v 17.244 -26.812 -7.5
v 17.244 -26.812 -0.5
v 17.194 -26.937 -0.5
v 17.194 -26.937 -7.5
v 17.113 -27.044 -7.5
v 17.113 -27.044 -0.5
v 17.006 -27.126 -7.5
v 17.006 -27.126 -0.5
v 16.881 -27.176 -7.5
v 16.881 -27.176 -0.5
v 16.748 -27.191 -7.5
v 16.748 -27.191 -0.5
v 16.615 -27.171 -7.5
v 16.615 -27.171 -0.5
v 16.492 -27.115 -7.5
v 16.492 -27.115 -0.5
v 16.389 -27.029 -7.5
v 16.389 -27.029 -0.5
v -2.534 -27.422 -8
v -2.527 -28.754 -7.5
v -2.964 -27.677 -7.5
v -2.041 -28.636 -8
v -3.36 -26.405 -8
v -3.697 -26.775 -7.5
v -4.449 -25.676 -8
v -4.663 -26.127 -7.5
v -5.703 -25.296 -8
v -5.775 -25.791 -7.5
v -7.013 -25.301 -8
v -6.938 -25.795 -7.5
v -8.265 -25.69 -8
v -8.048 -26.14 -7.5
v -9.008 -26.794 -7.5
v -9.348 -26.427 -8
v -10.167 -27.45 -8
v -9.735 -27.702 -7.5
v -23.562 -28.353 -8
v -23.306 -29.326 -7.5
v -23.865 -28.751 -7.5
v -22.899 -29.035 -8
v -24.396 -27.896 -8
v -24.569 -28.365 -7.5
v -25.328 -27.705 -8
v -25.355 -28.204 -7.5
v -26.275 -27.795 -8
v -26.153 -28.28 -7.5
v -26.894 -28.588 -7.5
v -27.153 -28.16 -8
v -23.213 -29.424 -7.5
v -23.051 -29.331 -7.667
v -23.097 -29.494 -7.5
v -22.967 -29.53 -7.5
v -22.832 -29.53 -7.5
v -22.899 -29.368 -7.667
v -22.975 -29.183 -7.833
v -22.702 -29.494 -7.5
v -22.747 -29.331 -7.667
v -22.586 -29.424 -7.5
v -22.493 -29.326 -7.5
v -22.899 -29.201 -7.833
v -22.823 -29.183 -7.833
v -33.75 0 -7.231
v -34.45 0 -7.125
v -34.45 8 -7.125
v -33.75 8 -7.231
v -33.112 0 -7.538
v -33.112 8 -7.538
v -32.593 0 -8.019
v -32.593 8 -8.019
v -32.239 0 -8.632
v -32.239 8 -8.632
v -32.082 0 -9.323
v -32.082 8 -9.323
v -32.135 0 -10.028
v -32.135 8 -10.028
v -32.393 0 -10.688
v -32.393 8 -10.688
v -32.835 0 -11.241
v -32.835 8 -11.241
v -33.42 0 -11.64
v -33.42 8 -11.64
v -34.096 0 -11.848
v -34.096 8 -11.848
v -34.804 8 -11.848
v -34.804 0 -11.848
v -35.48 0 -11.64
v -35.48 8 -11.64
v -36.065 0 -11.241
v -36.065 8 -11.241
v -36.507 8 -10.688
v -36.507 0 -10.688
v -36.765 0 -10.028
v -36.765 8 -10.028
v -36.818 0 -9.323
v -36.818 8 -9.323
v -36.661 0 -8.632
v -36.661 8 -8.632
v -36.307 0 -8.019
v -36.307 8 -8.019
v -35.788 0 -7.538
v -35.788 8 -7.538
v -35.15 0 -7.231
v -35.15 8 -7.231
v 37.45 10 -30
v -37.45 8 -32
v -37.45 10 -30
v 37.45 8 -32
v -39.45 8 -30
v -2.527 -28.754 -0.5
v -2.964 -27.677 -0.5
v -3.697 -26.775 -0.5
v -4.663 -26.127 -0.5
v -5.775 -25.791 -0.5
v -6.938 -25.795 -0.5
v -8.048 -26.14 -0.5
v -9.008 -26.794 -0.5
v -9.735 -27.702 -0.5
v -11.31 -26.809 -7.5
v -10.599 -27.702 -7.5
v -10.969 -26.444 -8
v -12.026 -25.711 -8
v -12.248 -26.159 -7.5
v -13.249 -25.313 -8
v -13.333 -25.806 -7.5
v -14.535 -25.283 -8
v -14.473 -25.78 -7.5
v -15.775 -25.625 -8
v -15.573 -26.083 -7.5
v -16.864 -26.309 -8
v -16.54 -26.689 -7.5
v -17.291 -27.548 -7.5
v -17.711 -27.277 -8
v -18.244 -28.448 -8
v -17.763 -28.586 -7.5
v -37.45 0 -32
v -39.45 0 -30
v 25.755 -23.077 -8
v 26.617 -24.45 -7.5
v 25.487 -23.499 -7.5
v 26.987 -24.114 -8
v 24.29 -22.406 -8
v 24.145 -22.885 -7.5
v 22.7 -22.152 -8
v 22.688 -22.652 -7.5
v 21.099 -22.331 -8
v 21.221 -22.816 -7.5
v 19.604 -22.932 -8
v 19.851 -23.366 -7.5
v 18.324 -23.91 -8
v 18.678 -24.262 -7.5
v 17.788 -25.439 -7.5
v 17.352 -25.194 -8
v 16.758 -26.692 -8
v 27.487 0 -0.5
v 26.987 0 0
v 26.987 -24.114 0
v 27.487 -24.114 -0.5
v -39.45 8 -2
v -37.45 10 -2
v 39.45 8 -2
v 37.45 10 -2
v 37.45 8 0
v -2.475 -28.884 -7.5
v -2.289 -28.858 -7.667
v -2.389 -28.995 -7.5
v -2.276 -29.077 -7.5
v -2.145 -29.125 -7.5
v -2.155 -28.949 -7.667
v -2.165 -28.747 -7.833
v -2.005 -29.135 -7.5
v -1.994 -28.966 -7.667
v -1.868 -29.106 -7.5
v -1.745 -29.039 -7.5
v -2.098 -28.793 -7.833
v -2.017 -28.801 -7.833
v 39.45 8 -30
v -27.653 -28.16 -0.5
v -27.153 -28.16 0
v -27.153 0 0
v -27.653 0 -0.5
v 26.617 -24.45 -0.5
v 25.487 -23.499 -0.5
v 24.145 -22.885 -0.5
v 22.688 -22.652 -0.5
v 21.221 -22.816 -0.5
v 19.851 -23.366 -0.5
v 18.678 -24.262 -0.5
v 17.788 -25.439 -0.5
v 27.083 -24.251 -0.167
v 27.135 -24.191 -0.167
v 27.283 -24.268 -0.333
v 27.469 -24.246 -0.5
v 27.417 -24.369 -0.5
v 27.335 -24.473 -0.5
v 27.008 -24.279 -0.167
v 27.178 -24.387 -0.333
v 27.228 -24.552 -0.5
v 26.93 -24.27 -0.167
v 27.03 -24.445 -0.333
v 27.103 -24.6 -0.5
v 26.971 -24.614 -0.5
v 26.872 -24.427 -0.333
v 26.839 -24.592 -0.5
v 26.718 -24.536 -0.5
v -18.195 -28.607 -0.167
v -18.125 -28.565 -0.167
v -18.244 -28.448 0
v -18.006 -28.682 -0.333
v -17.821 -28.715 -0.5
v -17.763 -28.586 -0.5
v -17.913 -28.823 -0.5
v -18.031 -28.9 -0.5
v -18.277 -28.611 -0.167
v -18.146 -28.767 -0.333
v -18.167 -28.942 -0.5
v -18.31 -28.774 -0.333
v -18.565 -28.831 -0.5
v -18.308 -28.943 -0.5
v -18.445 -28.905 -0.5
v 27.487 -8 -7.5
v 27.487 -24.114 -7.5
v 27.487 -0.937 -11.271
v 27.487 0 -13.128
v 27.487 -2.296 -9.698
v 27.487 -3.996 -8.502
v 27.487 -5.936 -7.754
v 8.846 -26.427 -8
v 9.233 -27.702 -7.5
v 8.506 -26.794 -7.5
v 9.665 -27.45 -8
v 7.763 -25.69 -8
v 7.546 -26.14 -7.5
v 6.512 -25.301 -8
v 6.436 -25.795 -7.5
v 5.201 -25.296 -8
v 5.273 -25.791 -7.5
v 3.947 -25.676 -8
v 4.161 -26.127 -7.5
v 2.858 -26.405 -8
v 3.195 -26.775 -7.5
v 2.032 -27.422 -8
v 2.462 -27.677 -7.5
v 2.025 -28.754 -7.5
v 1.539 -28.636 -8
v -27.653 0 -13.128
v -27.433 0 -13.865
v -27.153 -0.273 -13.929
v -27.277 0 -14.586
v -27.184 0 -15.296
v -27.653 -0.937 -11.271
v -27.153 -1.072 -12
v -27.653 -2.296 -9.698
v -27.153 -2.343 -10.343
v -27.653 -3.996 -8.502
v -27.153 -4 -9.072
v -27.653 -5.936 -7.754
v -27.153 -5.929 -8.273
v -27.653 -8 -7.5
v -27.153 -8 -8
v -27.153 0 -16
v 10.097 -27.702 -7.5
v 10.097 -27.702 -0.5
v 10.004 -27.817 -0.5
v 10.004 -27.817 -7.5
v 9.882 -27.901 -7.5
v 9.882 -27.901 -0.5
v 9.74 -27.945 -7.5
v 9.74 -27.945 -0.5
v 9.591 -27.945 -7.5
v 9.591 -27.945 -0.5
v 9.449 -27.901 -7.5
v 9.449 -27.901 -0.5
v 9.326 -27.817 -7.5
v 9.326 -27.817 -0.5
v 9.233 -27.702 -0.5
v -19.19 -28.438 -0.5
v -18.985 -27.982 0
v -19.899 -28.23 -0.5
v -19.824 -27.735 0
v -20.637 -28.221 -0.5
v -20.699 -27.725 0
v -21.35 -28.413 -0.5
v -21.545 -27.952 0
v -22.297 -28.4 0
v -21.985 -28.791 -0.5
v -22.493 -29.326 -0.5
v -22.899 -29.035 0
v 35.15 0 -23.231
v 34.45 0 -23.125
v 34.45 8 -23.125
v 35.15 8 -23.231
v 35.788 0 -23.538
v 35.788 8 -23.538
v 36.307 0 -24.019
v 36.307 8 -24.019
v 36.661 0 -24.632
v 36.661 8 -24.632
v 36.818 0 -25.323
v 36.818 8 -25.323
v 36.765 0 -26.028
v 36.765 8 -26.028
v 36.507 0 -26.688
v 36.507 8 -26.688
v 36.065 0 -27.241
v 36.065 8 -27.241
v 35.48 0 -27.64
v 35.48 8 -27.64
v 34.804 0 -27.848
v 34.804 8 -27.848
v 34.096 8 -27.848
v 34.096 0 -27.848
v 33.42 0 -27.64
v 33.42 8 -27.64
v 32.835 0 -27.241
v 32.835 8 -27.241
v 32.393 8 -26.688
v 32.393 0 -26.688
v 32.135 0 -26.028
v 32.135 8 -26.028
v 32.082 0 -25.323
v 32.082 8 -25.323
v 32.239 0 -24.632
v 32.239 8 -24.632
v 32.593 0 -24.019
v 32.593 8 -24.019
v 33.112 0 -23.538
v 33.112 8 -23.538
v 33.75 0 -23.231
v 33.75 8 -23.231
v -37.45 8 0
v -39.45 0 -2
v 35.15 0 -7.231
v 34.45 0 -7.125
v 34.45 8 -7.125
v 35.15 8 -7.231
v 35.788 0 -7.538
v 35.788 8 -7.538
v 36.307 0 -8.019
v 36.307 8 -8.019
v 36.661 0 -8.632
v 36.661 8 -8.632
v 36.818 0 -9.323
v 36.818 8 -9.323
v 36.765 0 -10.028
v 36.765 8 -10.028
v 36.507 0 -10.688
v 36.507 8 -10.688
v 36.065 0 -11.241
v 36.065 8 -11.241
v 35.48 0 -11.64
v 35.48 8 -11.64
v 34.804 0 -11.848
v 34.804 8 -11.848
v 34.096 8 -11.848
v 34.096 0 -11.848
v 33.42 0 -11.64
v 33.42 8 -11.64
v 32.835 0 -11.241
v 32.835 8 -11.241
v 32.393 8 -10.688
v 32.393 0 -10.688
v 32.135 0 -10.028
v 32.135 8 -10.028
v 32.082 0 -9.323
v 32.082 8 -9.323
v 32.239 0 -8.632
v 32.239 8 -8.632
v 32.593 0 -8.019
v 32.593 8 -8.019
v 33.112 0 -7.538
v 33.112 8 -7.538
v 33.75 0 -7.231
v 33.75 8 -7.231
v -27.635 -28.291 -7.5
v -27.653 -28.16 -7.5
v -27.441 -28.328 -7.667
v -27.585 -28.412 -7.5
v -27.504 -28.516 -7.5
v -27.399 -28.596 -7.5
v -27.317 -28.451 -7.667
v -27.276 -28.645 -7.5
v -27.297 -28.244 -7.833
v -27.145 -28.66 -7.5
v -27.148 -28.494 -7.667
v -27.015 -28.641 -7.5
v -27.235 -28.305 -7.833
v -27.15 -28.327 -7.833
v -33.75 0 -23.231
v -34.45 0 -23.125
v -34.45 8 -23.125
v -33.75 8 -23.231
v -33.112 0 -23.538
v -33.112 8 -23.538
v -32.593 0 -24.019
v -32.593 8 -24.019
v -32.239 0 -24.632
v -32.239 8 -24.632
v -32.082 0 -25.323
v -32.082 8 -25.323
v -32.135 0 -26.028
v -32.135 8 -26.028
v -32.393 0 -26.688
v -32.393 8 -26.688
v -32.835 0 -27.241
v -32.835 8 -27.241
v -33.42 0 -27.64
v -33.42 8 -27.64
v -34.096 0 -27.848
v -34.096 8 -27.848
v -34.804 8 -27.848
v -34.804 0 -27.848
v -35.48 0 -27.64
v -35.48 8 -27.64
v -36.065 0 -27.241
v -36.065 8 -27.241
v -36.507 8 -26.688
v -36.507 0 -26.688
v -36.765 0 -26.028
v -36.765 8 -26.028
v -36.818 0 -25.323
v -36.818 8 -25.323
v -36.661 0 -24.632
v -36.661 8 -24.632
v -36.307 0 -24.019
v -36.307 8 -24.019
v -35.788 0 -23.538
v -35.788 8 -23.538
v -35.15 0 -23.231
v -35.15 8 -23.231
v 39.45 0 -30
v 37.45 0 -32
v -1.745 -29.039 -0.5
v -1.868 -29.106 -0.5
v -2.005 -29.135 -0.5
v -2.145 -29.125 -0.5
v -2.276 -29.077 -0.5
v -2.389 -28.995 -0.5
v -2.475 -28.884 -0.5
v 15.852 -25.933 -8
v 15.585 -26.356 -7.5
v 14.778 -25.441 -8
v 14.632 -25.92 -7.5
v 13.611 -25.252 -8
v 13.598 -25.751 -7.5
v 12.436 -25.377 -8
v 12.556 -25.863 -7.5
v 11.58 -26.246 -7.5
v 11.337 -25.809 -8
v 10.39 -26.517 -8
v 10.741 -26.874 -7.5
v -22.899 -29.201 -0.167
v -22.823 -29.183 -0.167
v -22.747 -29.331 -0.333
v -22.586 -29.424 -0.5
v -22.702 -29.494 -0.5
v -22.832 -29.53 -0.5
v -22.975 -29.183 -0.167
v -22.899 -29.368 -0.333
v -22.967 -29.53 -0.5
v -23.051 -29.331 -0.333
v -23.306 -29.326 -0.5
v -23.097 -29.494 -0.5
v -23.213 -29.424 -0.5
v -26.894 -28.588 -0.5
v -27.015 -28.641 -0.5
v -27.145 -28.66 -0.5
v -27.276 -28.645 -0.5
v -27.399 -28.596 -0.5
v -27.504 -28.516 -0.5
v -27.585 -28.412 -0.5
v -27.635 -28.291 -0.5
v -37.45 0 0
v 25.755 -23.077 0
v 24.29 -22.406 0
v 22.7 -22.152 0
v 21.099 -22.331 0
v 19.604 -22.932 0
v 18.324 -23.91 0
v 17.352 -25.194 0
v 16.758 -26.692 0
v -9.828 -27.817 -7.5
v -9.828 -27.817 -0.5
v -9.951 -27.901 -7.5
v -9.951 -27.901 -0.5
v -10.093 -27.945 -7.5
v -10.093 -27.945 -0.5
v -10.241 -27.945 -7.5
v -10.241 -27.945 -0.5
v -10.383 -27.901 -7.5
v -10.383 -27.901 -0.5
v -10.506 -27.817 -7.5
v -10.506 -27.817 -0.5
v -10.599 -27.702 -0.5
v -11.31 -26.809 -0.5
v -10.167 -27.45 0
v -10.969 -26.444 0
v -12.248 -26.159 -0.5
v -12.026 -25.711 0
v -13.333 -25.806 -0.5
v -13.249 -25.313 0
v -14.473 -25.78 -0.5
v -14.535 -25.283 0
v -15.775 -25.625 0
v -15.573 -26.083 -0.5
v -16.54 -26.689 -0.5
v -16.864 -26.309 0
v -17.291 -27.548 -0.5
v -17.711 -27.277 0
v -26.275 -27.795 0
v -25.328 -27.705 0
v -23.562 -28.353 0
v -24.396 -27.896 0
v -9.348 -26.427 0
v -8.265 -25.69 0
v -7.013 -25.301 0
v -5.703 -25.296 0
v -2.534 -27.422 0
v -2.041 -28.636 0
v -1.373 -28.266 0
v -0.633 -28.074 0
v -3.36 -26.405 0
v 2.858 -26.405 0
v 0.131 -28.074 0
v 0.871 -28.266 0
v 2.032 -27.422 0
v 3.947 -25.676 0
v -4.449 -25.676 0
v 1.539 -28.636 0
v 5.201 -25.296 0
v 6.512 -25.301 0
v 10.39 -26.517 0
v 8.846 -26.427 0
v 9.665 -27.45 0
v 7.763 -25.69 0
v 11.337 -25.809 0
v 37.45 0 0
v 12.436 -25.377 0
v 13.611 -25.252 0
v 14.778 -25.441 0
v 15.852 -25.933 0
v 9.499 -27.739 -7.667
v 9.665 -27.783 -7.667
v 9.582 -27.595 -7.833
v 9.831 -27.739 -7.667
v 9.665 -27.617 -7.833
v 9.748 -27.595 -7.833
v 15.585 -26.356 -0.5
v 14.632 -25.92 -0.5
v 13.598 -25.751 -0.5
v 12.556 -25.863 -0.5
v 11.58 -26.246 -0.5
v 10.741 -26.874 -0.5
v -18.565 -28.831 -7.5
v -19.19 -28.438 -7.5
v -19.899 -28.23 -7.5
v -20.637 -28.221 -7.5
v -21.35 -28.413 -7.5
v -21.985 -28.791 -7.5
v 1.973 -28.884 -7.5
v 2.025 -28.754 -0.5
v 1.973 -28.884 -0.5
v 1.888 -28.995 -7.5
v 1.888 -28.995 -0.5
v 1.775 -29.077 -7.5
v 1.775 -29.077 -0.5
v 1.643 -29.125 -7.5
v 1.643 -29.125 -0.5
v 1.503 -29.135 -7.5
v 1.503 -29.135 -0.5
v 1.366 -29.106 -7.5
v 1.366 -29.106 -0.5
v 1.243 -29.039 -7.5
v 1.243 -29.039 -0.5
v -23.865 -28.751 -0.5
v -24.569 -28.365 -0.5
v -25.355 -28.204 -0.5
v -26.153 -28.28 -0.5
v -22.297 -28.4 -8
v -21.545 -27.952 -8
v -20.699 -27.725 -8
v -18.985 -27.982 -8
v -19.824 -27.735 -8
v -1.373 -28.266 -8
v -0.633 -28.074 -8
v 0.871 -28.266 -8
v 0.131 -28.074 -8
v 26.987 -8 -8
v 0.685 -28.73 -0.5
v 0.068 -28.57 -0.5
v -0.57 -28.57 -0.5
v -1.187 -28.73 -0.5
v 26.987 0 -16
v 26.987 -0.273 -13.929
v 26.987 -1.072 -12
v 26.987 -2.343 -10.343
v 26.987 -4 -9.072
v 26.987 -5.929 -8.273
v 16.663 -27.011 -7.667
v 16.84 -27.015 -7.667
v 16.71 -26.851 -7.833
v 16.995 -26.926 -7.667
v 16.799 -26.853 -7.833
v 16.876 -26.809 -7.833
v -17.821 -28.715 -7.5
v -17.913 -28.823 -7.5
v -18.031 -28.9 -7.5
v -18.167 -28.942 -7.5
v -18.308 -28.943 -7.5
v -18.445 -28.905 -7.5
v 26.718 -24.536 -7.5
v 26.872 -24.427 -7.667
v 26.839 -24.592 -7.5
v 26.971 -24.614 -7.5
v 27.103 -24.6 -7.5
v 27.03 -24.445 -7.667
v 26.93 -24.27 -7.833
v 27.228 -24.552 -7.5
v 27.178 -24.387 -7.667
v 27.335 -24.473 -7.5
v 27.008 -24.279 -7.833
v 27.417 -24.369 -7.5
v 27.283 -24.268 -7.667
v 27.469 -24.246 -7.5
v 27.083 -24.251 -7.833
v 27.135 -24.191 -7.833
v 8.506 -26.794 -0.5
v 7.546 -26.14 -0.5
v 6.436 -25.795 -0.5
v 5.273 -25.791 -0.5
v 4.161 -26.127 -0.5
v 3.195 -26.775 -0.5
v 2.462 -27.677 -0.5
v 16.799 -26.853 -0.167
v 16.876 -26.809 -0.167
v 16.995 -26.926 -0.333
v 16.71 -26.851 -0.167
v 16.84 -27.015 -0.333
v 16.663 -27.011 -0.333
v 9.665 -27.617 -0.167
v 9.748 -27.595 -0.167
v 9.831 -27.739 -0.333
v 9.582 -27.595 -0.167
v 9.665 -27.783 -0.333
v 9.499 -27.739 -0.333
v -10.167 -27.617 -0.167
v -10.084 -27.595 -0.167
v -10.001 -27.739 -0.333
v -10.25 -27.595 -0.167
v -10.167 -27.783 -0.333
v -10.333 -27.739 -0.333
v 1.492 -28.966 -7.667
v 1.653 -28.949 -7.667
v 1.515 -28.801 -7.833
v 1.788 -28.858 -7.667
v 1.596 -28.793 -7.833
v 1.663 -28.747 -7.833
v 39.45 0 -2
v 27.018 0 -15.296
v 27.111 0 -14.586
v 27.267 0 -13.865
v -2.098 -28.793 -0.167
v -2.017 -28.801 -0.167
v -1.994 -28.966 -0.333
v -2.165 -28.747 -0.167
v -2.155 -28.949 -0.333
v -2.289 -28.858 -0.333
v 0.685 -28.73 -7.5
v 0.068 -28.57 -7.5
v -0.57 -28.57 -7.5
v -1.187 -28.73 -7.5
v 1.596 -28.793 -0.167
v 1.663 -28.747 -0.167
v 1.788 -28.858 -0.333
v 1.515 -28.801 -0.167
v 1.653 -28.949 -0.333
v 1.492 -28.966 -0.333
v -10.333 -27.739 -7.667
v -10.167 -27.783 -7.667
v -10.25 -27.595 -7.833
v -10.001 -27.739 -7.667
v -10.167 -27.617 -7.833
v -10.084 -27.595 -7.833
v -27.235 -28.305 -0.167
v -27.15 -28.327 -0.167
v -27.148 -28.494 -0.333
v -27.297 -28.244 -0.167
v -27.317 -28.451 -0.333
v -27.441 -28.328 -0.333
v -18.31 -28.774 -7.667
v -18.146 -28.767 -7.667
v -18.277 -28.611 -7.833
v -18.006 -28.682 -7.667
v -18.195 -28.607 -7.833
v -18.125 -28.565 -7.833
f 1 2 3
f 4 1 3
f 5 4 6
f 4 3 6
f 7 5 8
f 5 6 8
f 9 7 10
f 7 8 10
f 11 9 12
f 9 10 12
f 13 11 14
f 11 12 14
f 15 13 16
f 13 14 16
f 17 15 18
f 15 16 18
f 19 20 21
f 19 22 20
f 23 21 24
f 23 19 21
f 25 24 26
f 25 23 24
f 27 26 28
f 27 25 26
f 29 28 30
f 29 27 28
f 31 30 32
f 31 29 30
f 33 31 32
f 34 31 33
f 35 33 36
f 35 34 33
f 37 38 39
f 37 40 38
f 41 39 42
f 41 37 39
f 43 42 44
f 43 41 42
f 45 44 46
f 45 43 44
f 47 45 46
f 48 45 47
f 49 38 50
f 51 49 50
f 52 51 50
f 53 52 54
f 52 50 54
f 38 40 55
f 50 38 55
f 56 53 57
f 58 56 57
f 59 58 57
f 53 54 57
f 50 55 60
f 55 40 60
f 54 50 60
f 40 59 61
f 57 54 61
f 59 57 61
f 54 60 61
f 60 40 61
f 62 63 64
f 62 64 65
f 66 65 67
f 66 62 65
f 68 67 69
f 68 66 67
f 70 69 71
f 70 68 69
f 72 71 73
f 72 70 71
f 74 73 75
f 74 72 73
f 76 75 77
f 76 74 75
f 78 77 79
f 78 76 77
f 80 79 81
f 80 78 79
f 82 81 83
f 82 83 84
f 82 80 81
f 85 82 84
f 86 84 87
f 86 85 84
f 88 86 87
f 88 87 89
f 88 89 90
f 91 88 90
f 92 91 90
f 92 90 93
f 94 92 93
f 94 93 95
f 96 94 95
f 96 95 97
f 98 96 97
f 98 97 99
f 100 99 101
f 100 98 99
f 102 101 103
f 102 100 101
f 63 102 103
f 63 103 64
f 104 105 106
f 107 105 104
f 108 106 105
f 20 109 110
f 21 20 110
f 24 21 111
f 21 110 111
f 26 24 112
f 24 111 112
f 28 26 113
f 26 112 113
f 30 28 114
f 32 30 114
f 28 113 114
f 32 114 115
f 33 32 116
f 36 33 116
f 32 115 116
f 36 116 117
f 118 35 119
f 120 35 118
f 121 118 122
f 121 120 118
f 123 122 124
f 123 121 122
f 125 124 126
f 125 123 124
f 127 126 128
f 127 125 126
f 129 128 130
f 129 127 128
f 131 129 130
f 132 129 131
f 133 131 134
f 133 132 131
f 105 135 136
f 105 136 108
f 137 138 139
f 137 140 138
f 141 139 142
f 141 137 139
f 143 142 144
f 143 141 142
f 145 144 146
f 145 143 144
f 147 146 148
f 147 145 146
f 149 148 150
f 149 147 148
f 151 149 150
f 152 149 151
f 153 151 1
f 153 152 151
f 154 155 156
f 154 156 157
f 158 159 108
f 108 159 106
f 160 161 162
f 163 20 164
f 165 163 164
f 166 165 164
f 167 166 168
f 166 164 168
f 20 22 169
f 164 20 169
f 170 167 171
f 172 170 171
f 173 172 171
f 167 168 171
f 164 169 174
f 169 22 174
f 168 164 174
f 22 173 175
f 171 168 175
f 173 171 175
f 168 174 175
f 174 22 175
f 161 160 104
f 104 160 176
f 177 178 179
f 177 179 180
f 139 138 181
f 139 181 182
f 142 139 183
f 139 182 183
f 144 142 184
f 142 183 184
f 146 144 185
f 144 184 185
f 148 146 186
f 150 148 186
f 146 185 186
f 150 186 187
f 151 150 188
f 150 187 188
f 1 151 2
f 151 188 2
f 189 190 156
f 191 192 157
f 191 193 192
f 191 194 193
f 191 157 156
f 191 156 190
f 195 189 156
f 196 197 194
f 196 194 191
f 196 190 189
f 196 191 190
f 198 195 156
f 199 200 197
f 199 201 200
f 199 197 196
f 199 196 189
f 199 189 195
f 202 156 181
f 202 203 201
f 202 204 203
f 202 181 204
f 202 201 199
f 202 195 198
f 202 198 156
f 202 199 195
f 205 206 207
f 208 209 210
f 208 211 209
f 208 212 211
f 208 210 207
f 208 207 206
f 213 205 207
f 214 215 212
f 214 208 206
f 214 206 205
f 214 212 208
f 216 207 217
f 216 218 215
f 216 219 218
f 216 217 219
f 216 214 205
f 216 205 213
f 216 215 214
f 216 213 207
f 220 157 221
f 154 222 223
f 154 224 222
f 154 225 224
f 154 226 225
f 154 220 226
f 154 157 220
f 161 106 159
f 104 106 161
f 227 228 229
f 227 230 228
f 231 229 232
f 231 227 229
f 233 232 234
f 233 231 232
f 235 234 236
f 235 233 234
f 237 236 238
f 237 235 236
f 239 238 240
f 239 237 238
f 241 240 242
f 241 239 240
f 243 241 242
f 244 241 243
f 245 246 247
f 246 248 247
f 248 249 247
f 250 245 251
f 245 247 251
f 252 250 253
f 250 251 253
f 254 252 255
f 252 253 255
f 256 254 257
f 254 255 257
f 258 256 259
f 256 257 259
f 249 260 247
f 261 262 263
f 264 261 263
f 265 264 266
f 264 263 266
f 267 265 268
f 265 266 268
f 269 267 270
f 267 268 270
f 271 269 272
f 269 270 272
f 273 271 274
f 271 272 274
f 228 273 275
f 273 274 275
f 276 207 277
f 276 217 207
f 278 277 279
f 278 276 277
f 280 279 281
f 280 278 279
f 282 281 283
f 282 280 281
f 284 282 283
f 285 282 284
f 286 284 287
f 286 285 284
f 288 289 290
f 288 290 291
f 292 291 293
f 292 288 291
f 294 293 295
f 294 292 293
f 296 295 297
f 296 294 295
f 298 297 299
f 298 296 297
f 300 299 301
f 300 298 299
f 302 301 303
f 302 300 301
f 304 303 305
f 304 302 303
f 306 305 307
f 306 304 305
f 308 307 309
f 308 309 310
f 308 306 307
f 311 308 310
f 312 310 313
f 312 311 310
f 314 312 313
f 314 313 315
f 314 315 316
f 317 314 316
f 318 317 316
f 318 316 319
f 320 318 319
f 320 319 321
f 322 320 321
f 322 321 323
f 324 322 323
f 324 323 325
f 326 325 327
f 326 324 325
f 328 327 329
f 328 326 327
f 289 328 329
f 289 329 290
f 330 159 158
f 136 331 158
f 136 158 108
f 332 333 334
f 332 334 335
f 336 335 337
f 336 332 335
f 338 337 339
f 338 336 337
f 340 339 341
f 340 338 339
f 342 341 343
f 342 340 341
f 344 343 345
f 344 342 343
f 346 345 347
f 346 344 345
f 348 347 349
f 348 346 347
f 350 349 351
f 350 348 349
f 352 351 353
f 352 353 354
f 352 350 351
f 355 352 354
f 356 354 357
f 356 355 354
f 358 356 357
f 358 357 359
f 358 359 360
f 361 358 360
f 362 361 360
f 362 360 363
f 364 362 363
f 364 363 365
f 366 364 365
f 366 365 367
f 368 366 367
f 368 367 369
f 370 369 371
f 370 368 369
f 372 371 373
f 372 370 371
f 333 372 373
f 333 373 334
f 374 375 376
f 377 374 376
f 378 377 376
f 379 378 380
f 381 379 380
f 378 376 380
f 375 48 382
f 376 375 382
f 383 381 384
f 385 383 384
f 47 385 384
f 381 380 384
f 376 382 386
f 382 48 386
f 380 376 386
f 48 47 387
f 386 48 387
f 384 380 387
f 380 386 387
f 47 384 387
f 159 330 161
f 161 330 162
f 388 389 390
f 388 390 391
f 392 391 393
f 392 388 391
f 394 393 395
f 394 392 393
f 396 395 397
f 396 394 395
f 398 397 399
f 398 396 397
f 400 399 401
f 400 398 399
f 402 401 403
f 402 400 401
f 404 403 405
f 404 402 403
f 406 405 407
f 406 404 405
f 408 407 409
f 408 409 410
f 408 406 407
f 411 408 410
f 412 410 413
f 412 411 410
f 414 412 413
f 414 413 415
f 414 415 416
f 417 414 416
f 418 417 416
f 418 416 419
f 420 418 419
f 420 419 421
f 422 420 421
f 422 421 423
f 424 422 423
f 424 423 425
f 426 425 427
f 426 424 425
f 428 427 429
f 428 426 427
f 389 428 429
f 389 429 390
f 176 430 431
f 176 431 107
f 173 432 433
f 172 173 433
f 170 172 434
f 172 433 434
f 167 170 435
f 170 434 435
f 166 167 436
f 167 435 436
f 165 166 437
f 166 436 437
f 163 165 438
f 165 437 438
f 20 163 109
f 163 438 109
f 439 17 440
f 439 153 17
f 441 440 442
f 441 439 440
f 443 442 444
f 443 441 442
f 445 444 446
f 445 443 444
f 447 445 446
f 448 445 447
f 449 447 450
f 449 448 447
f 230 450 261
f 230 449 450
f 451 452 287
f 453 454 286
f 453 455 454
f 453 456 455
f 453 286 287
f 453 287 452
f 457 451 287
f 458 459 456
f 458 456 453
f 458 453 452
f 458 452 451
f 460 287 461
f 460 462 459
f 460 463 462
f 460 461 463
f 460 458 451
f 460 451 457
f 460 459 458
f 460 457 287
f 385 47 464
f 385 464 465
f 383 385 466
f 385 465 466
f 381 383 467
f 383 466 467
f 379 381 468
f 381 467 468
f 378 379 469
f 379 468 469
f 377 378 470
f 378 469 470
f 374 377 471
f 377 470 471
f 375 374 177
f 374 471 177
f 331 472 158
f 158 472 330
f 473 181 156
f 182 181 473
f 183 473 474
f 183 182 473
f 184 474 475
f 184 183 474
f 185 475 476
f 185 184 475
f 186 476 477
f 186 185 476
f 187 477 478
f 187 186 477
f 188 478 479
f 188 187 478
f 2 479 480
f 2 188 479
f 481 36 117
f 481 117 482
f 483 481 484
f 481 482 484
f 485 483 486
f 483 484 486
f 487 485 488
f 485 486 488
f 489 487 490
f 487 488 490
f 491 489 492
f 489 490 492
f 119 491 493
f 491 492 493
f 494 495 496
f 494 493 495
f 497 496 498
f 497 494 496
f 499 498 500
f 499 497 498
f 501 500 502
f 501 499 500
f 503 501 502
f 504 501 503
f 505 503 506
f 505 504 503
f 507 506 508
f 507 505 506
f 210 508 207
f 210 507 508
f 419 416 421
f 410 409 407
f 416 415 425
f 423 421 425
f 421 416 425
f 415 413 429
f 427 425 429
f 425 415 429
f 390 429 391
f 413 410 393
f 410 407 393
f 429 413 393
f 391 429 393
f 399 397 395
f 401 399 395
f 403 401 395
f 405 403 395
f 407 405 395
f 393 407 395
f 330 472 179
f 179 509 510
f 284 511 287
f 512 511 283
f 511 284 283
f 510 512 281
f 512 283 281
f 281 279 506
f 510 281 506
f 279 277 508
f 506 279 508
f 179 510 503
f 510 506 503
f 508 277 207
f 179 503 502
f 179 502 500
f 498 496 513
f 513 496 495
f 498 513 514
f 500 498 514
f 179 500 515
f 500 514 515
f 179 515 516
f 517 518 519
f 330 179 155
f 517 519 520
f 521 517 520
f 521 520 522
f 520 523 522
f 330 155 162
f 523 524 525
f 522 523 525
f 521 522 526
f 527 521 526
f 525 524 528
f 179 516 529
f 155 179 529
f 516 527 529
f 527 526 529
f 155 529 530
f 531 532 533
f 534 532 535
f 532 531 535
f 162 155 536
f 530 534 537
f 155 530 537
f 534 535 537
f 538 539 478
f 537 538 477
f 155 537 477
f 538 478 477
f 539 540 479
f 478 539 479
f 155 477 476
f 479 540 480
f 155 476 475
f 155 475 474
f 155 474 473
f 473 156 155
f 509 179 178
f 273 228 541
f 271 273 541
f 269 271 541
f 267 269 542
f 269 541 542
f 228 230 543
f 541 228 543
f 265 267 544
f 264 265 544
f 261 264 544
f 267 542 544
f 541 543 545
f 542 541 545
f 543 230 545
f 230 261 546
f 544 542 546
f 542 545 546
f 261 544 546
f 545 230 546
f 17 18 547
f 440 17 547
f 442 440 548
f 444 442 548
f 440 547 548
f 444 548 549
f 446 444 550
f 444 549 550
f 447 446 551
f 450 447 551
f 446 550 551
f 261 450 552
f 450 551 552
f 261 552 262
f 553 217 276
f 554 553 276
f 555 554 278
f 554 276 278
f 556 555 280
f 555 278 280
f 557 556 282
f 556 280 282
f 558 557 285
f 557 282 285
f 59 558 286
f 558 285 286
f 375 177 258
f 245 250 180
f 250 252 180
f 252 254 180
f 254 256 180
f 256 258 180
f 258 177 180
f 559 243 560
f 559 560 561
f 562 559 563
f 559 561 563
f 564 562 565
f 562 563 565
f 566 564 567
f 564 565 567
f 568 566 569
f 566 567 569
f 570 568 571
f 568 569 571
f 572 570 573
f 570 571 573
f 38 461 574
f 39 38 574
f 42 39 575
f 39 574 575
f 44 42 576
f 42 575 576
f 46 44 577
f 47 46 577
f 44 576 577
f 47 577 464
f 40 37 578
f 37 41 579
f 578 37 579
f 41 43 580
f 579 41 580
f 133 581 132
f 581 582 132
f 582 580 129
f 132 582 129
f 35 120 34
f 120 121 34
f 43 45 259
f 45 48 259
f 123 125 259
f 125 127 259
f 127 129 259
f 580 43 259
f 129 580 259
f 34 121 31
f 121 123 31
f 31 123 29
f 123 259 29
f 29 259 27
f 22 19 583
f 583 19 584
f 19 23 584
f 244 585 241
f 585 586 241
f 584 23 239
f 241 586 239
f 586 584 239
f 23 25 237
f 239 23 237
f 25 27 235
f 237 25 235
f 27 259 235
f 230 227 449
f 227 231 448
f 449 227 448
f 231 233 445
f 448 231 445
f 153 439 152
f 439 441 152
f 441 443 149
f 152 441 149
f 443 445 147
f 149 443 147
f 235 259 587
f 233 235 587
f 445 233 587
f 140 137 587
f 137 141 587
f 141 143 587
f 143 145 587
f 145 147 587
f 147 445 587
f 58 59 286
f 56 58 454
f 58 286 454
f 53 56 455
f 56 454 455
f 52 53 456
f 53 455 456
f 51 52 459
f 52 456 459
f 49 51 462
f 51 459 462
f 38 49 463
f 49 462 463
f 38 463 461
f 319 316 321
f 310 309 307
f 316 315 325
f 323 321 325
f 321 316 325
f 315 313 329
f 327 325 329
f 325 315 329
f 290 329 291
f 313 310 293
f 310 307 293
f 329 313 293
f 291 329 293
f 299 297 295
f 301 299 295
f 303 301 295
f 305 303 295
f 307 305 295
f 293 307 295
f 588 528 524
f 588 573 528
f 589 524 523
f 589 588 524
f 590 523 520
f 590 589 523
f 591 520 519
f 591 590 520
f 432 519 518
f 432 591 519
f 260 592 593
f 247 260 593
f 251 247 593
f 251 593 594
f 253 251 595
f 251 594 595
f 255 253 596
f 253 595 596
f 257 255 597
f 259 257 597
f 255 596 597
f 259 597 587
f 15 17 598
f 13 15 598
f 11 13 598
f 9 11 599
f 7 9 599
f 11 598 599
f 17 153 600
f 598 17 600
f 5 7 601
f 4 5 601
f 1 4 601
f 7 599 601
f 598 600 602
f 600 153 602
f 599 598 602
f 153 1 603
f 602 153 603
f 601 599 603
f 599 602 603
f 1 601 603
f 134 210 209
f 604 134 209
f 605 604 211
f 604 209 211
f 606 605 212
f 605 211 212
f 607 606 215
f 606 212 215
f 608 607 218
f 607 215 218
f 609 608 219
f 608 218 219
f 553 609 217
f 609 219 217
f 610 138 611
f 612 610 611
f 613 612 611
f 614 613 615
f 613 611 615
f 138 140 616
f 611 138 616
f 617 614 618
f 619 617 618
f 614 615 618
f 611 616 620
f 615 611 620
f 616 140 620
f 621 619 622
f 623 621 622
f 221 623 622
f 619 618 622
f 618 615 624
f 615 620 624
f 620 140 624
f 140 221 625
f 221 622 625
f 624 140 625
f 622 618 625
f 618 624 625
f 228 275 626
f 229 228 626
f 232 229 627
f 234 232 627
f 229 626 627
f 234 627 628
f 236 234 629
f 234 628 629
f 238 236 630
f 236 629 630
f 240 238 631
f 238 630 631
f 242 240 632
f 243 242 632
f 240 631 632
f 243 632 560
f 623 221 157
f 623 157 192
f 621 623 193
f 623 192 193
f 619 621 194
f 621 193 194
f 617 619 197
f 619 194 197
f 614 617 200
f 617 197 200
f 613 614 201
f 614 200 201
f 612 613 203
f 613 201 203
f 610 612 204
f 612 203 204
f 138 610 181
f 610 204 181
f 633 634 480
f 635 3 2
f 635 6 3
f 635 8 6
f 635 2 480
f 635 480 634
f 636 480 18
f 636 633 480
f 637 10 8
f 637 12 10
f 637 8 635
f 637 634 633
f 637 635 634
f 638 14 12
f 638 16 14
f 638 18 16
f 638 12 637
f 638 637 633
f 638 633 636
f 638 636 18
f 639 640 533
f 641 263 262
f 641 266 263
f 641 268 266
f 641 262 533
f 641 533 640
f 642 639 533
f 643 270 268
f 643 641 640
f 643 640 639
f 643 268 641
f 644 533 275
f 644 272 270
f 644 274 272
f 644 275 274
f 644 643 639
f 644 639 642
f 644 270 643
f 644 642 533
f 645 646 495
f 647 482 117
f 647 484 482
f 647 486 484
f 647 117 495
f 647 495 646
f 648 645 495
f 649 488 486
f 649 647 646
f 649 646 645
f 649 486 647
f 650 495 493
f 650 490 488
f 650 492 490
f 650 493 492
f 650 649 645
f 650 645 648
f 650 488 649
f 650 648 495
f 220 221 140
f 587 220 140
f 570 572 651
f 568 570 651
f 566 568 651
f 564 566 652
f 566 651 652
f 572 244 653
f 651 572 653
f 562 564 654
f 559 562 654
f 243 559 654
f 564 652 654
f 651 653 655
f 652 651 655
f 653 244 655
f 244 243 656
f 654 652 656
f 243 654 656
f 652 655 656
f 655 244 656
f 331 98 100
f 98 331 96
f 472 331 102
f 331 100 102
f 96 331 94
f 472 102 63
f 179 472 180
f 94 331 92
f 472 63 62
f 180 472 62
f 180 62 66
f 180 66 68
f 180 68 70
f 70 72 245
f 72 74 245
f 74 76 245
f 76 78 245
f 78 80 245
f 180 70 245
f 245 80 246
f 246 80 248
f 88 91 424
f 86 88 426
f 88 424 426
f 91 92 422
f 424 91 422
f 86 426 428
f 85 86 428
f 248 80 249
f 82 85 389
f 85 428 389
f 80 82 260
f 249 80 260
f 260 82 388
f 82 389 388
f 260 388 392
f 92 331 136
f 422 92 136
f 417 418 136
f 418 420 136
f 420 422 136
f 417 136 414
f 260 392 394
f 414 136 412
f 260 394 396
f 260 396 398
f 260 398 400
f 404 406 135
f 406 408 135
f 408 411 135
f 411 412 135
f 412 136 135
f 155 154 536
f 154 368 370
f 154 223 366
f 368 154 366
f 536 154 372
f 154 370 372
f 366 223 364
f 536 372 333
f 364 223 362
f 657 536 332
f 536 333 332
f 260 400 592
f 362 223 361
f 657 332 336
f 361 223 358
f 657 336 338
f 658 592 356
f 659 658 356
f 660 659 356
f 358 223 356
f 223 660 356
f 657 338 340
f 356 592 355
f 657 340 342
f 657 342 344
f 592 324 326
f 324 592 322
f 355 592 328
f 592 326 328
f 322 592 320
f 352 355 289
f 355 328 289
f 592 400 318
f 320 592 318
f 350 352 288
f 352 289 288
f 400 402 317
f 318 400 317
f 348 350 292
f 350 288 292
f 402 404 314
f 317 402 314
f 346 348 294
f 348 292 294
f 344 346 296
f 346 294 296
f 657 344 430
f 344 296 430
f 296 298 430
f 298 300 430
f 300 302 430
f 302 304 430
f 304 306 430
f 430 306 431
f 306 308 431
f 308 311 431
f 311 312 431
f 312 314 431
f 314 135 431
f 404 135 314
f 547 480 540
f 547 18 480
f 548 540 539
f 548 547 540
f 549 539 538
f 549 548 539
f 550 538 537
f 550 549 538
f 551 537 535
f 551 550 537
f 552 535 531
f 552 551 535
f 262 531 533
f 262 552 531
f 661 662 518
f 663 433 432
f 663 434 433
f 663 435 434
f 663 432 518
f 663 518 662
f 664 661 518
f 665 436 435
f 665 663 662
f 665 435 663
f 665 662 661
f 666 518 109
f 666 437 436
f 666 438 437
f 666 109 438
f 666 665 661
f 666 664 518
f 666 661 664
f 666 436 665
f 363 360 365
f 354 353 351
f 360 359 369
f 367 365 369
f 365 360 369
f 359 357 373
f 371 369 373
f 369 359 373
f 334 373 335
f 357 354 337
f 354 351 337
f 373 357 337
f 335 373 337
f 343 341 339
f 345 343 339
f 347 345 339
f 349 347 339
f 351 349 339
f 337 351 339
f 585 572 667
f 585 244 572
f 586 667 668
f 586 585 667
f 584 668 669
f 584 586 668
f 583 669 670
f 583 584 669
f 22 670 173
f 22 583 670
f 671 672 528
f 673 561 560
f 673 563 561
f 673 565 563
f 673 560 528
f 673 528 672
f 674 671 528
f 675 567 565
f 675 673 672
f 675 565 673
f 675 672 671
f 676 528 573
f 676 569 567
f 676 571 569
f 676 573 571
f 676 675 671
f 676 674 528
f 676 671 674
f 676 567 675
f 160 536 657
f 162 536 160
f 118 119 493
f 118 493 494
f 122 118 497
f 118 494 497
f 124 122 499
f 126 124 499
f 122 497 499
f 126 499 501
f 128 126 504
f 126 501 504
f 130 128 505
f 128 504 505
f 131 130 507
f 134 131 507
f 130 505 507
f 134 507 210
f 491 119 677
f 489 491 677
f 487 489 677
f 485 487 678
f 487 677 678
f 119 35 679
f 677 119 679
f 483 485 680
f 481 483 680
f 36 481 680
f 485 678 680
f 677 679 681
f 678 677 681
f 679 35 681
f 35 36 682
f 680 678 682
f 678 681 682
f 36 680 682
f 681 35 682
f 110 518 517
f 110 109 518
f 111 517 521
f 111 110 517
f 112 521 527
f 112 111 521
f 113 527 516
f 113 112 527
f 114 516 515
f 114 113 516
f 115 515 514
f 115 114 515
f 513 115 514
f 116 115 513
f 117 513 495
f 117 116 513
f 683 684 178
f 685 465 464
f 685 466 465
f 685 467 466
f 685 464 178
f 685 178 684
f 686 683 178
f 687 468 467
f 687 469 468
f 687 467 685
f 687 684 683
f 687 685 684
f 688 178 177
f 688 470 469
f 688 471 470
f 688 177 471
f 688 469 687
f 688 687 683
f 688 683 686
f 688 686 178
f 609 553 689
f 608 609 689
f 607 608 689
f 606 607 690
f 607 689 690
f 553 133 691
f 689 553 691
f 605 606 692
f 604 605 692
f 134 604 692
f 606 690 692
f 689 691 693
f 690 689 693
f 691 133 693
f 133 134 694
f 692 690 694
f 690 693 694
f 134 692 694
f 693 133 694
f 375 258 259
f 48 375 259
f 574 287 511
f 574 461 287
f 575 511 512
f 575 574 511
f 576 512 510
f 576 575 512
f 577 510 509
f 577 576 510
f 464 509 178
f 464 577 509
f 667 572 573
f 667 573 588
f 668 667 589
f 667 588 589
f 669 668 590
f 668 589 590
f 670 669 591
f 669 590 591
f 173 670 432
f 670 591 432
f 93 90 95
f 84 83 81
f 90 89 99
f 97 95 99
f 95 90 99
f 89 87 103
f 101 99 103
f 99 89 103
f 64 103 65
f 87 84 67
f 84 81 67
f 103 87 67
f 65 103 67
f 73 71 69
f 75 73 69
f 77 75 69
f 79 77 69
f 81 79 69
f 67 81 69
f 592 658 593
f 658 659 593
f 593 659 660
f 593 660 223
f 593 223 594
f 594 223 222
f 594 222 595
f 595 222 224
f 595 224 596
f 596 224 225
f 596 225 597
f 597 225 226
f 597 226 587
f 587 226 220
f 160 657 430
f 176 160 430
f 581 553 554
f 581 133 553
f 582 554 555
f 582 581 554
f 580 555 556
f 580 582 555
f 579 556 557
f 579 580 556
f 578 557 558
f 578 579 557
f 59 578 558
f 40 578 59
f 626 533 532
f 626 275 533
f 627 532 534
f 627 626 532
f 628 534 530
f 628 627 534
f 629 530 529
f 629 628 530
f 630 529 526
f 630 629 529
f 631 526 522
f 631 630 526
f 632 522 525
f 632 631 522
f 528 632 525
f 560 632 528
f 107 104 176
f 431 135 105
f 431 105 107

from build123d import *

# Parameters (mm, degrees)
SKETCH3_W           = 78.9
SKETCH3_H           = 32
BOSS_EXTRUDE1_DEPTH = 10
SKETCH3_4_R         = 2.375
CUT_EXTRUDE1_DEPTH  = 8
SKETCH4_W           = 55.14
SKETCH4_H           = 33.5
BOSS_EXTRUDE2_DEPTH = 8
CUT_EXTRUDE2_REACH  = 62.849
FILLET1_R           = 8
CHAMFER1_SIZE       = 2
CHAMFER2_SIZE       = 0.5


with BuildPart() as part:
    # Sketch3 → Boss-Extrude1 (new body)
    with BuildSketch(Plane(origin=(0, 0, 0), x_dir=(1, 0, 0), z_dir=(0, 1, 0))):
        with Locations((0, 16)):
            Rectangle(SKETCH3_W, SKETCH3_H)
    extrude(amount=BOSS_EXTRUDE1_DEPTH)

    # Sketch3<4> → Cut-Extrude1 (cut)
    with BuildSketch(Plane(origin=(0, 0, 0), x_dir=(1, 0, 0), z_dir=(0, 1, 0))):
        with Locations(Location((-34.45, 9.5, 0), (0, 0, 270))):
            Circle(SKETCH3_4_R)
        with Locations(Location((34.45, 9.5, 0), (0, 0, 270))):
            Circle(SKETCH3_4_R)
        with Locations(Location((-34.45, 25.5, 0), (0, 0, 270))):
            Circle(SKETCH3_4_R)
        with Locations(Location((34.45, 25.5, 0), (0, 0, 270))):
            Circle(SKETCH3_4_R)
    extrude(amount=CUT_EXTRUDE1_DEPTH, mode=Mode.SUBTRACT)

    # Sketch4 → Boss-Extrude2 (add)
    with BuildSketch(Plane.XY):
        with Locations((-0.082754798, -16.75)):
            Rectangle(SKETCH4_W, SKETCH4_H)
    extrude(amount=-BOSS_EXTRUDE2_DEPTH)

    # Sketch6 → Cut-Extrude2 (cut, up to next)
    with BuildSketch(Plane.XY, mode=Mode.PRIVATE) as cut_extrude2_sk1:
        with BuildLine():
            Line((-27.652754798, -33.5), (27.487245202, -33.5))
            Line((27.487245202, -33.5), (27.487245202, -24.11389297))
            ThreePointArc((27.487245202, -24.11389297), (27.167115928, -24.580418984), (26.616659115, -24.449550462))
            ThreePointArc((26.616659115, -24.449550462), (21.220888935, -22.815972253), (17.243633004, -26.811513376))
            ThreePointArc((17.243633004, -26.811513376), (16.881366116, -27.176161871), (16.388971366, -27.028672095))
            ThreePointArc((16.388971366, -27.028672095), (13.072861481, -25.77225608), (10.097455449, -27.701537013))
            ThreePointArc((10.097455449, -27.701537013), (9.665252059, -27.950140454), (9.23304867, -27.701537013))
            ThreePointArc((9.23304867, -27.701537013), (5.273342581, -25.791156717), (2.024915276, -28.753680172))
            ThreePointArc((2.024915276, -28.753680172), (1.710503102, -29.105939189), (1.243047888, -29.039403086))
            ThreePointArc((1.243047888, -29.039403086), (-0.250930092, -28.55), (-1.744908072, -29.039403086))
            ThreePointArc((-1.744908072, -29.039403086), (-2.212363286, -29.105939189), (-2.526775459, -28.753680172))
            ThreePointArc((-2.526775459, -28.753680172), (-5.775202765, -25.791156717), (-9.734908853, -27.701537013))
            ThreePointArc((-9.734908853, -27.701537013), (-10.167112243, -27.950140454), (-10.599315633, -27.701537013))
            ThreePointArc((-10.599315633, -27.701537013), (-14.473243405, -25.779600431), (-17.763117677, -28.586357258))
            ThreePointArc((-17.763117677, -28.586357258), (-18.097629496, -28.925925167), (-18.564711553, -28.830852177))
            ThreePointArc((-18.564711553, -28.830852177), (-20.636908569, -28.221196647), (-22.493001056, -29.326004785))
            ThreePointArc((-22.493001056, -29.326004785), (-22.899251056, -29.534524189), (-23.305501056, -29.326004785))
            ThreePointArc((-23.305501056, -29.326004785), (-24.955684592, -28.255281584), (-26.894394838, -28.588382855))
            ThreePointArc((-26.894394838, -28.588382855), (-27.398539277, -28.595724932), (-27.652754798, -28.160305606))
            Line((-27.652754798, -28.160305606), (-27.652754798, -33.5))
        make_face()
    cut_extrude2_tool1 = extrude(cut_extrude2_sk1.sketch, amount=-CUT_EXTRUDE2_REACH, mode=Mode.PRIVATE) & part.part
    add(cut_extrude2_tool1.solids().sort_by_distance((2.915251, -29.773814, 0))[0], mode=Mode.SUBTRACT)

    # Fillet1
    fillet1_edges = [part.edges().sort_by_distance(p)[0] for p in [
        (-0.082754798, 0, -8),
    ]]
    fillet(fillet1_edges, radius=FILLET1_R)

    # Chamfer1
    chamfer1_edges = [part.edges().sort_by_distance(p)[0] for p in [
        (39.45, 10, -16),
        (0, 10, 0),
        (-39.45, 10, -16),
        (0, 10, -32),
        (-39.45, 5, 0),
        (39.45, 5, 0),
        (39.45, 5, -32),
        (-39.45, 5, -32),
    ]]
    chamfer(chamfer1_edges, length=CHAMFER1_SIZE)

    # Chamfer2
    # the kernel refuses this chamfer: 0.5 mm, written as the material it takes off along each edge
    with BuildSketch(Plane(origin=(-27.652754798, -28.160305606, -8), x_dir=(0, 0, 1), z_dir=(0, 1, 0))) as chamfer2_piece_1:
        Polygon((CHAMFER2_SIZE, 0), (0, CHAMFER2_SIZE), (0, 0), align=None)
    extrude(amount=20.160305606, mode=Mode.SUBTRACT)
    with BuildSketch(Plane(origin=(-27.652754798, -8, -16), x_dir=(0, 0.8858914010009324, -0.4638926876257108), z_dir=(0, -0.4638926876257108, -0.8858914010009324))) as chamfer2_piece_2_section:
        Polygon((8 + CHAMFER2_SIZE, 0), (8, CHAMFER2_SIZE), (8, 0), align=None)
    chamfer2_piece_2 = revolve(axis=Axis((-27.652754798, -8, -16), (1, 0, 0)), revolution_arc=117.638582209, mode=Mode.PRIVATE)
    chamfer2_piece_2 = split(chamfer2_piece_2, bisect_by=Plane(origin=(-27.652754798, 0, -16), z_dir=(0, -1, 0)), keep=Keep.TOP, mode=Mode.PRIVATE)
    add(chamfer2_piece_2, mode=Mode.SUBTRACT)
    with BuildSketch(Plane(origin=(27.487245202, -8, -16), x_dir=(0, 0.8858914010009324, -0.4638926876257108), z_dir=(0, -0.4638926876257108, -0.8858914010009324))) as chamfer2_piece_3_section:
        Polygon((8, -CHAMFER2_SIZE), (8 + CHAMFER2_SIZE, 0), (8, 0), align=None)
    chamfer2_piece_3 = revolve(axis=Axis((27.487245202, -8, -16), (1, 0, 0)), revolution_arc=117.638582209, mode=Mode.PRIVATE)
    chamfer2_piece_3 = split(chamfer2_piece_3, bisect_by=Plane(origin=(27.487245202, 0, -16), z_dir=(0, -1, 0)), keep=Keep.TOP, mode=Mode.PRIVATE)
    add(chamfer2_piece_3, mode=Mode.SUBTRACT)
    with BuildSketch(Plane(origin=(-27.652754798, -28.160305606, 0), x_dir=(1, 0, 0), z_dir=(0, 1, 0))) as chamfer2_piece_4:
        Polygon((CHAMFER2_SIZE, 0), (0, CHAMFER2_SIZE), (0, 0), align=None)
    extrude(amount=28.160305606, mode=Mode.SUBTRACT)
    with BuildSketch(Plane(origin=(27.487245202, -8, -8), x_dir=(0, 0, 1), z_dir=(0, -1, 0))) as chamfer2_piece_5:
        Polygon((CHAMFER2_SIZE, 0), (0, CHAMFER2_SIZE), (0, 0), align=None)
    extrude(amount=16.11389297, mode=Mode.SUBTRACT)
    with BuildSketch(Plane(origin=(27.487245202, 0, 0), x_dir=(-1, 0, 0), z_dir=(0, -1, 0))) as chamfer2_piece_6:
        Polygon((CHAMFER2_SIZE, 0), (0, CHAMFER2_SIZE), (0, 0), align=None)
    extrude(amount=24.11389297, mode=Mode.SUBTRACT)
    with BuildSketch(Plane(origin=(-18.243500534, -28.447676654, -8), x_dir=(-0.6424220378621972, -0.7663510457153313, 0), z_dir=(-0.7663510457153313, 0.6424220378621972, 0))) as chamfer2_piece_7:
        Polygon((0.5, CHAMFER2_SIZE), (0.5 - CHAMFER2_SIZE, 0), (0.5, 0), align=None)
    revolve(axis=Axis((-18.243500534, -28.447676654, -8), (0, 0, 1)), revolution_arc=113.869886465, mode=Mode.SUBTRACT)
    with BuildSketch(Plane(origin=(-13.992112243, -29.675, -8), x_dir=(0.8644067796610168, 0.5027931177691978, 0), z_dir=(0.5027931177691978, -0.8644067796610168, 0))) as chamfer2_piece_8:
        Polygon((3.925, CHAMFER2_SIZE), (3.925 + CHAMFER2_SIZE, 0), (3.925, 0), align=None)
    revolve(axis=Axis((-13.992112243, -29.675, -8), (0, 0, 1)), revolution_arc=133.712259818, mode=Mode.SUBTRACT)
    with BuildSketch(Plane(origin=(-10.167112243, -27.450140454, -8), x_dir=(-0.8644067796610185, -0.5027931177691948, 0), z_dir=(-0.5027931177691948, 0.8644067796610185, 0))) as chamfer2_piece_9:
        Polygon((0.5, CHAMFER2_SIZE), (0.5 - CHAMFER2_SIZE, 0), (0.5, 0), align=None)
    revolve(axis=Axis((-10.167112243, -27.450140454, -8), (0, 0, 1)), revolution_arc=119.63007225, mode=Mode.SUBTRACT)
    with BuildSketch(Plane(origin=(-6.342112243, -29.675, -8), x_dir=(0.9720603270931867, 0.23473116642552358, 0), z_dir=(0.23473116642552358, -0.9720603270931867, 0))) as chamfer2_piece_10:
        Polygon((3.925, CHAMFER2_SIZE), (3.925 + CHAMFER2_SIZE, 0), (3.925, 0), align=None)
    revolve(axis=Axis((-6.342112243, -29.675, -8), (0, 0, 1)), revolution_arc=136.239259635, mode=Mode.SUBTRACT)
    with BuildSketch(Plane(origin=(-2.040745296, -28.636314589, -8), x_dir=(-0.9720603270931848, -0.23473116642553216, 0), z_dir=(-0.23473116642553216, 0.9720603270931848, 0))) as chamfer2_piece_11:
        Polygon((0.5, CHAMFER2_SIZE), (0.5 - CHAMFER2_SIZE, 0), (0.5, 0), align=None)
    revolve(axis=Axis((-2.040745296, -28.636314589, -8), (0, 0, 1)), revolution_arc=112.700145839, mode=Mode.SUBTRACT)
    with BuildSketch(Plane(origin=(-0.250930092, -31.075, -8), x_dir=(0.5916744475658624, 0.8061769955150243, 0), z_dir=(0.8061769955150243, -0.5916744475658624, 0))) as chamfer2_piece_12:
        Polygon((2.525, CHAMFER2_SIZE), (2.525 + CHAMFER2_SIZE, 0), (2.525, 0), align=None)
    revolve(axis=Axis((-0.250930092, -31.075, -8), (0, 0, 1)), revolution_arc=72.551844659, mode=Mode.SUBTRACT)
    with BuildSketch(Plane(origin=(1.538885112, -28.636314589, -8), x_dir=(-0.5916744475658654, -0.8061769955150222, 0), z_dir=(-0.8061769955150222, 0.5916744475658654, 0))) as chamfer2_piece_13:
        Polygon((0.5, CHAMFER2_SIZE), (0.5 - CHAMFER2_SIZE, 0), (0.5, 0), align=None)
    revolve(axis=Axis((1.538885112, -28.636314589, -8), (0, 0, 1)), revolution_arc=112.700145839, mode=Mode.SUBTRACT)
    with BuildSketch(Plane(origin=(5.840252059, -29.675, -8), x_dir=(0.864406779661017, 0.5027931177691973, 0), z_dir=(0.5027931177691973, -0.864406779661017, 0))) as chamfer2_piece_14:
        Polygon((3.925, CHAMFER2_SIZE), (3.925 + CHAMFER2_SIZE, 0), (3.925, 0), align=None)
    revolve(axis=Axis((5.840252059, -29.675, -8), (0, 0, 1)), revolution_arc=136.239259635, mode=Mode.SUBTRACT)
    with BuildSketch(Plane(origin=(9.665252059, -27.450140454, -8), x_dir=(-0.8644067796610146, -0.5027931177692017, 0), z_dir=(-0.5027931177692017, 0.8644067796610146, 0))) as chamfer2_piece_15:
        Polygon((0.5, CHAMFER2_SIZE), (0.5 - CHAMFER2_SIZE, 0), (0.5, 0), align=None)
    revolve(axis=Axis((9.665252059, -27.450140454, -8), (0, 0, 1)), revolution_arc=119.63007225, mode=Mode.SUBTRACT)
    with BuildSketch(Plane(origin=(13.490252059, -29.675, -8), x_dir=(0.7385272118911914, 0.6742236700800583, 0), z_dir=(0.6742236700800583, -0.7385272118911914, 0))) as chamfer2_piece_16:
        Polygon((3.925, CHAMFER2_SIZE), (3.925 + CHAMFER2_SIZE, 0), (3.925, 0), align=None)
    revolve(axis=Axis((13.490252059, -29.675, -8), (0, 0, 1)), revolution_arc=107.421143416, mode=Mode.SUBTRACT)
    with BuildSketch(Plane(origin=(16.758234972, -26.69156026, -8), x_dir=(-0.7385272118911994, -0.6742236700800496, 0), z_dir=(-0.6742236700800496, 0.7385272118911994, 0))) as chamfer2_piece_17:
        Polygon((0.5, CHAMFER2_SIZE), (0.5 - CHAMFER2_SIZE, 0), (0.5, 0), align=None)
    revolve(axis=Axis((16.758234972, -26.69156026, -8), (0, 0, 1)), revolution_arc=123.725101084, mode=Mode.SUBTRACT)
    with BuildSketch(Plane(origin=(22.55874146, -28.125, -8), x_dir=(0.7411721744642813, 0.6713149840424306, 0), z_dir=(0.6713149840424306, -0.7411721744642813, 0))) as chamfer2_piece_18:
        Polygon((5.475, CHAMFER2_SIZE), (5.475 + CHAMFER2_SIZE, 0), (5.475, 0), align=None)
    revolve(axis=Axis((22.55874146, -28.125, -8), (0, 0, 1)), revolution_arc=123.950356593, mode=Mode.SUBTRACT)
    with BuildSketch(Plane(origin=(26.987245202, -24.11389297, -8), x_dir=(-0.7411721744642809, -0.6713149840424313, 0), z_dir=(-0.6713149840424313, 0.7411721744642809, 0))) as chamfer2_piece_19:
        Polygon((0.5, CHAMFER2_SIZE), (0.5 - CHAMFER2_SIZE, 0), (0.5, 0), align=None)
    revolve(axis=Axis((26.987245202, -24.11389297, -8), (0, 0, 1)), revolution_arc=137.831362799, mode=Mode.SUBTRACT)
    with BuildSketch(Plane(origin=(-27.152754798, -28.160305606, -8), x_dir=(-1, 0, 0), z_dir=(0, 1, 0))) as chamfer2_piece_20:
        Polygon((0.5, CHAMFER2_SIZE), (0.5 - CHAMFER2_SIZE, 0), (0.5, 0), align=None)
    revolve(axis=Axis((-27.152754798, -28.160305606, -8), (0, 0, 1)), revolution_arc=121.112486243, mode=Mode.SUBTRACT)
    with BuildSketch(Plane(origin=(-25.499251056, -30.9, -8), x_dir=(0.8125000000000023, 0.5829611908180474, 0), z_dir=(0.5829611908180474, -0.8125000000000023, 0))) as chamfer2_piece_21:
        Polygon((2.7, CHAMFER2_SIZE), (2.7 + CHAMFER2_SIZE, 0), (2.7, 0), align=None)
    revolve(axis=Axis((-25.499251056, -30.9, -8), (0, 0, 1)), revolution_arc=85.453398547, mode=Mode.SUBTRACT)
    with BuildSketch(Plane(origin=(-22.899251056, -29.034524189, -8), x_dir=(-0.8124999999999996, -0.5829611908180515, 0), z_dir=(-0.5829611908180515, 0.8124999999999996, 0))) as chamfer2_piece_22:
        Polygon((0.5, CHAMFER2_SIZE), (0.5 - CHAMFER2_SIZE, 0), (0.5, 0), align=None)
    revolve(axis=Axis((-22.899251056, -29.034524189, -8), (0, 0, 1)), revolution_arc=108.681824608, mode=Mode.SUBTRACT)
    with BuildSketch(Plane(origin=(-20.299251056, -30.9, -8), x_dir=(0.6424220378622064, 0.7663510457153235, 0), z_dir=(0.7663510457153235, -0.6424220378622064, 0))) as chamfer2_piece_23:
        Polygon((2.7, CHAMFER2_SIZE), (2.7 + CHAMFER2_SIZE, 0), (2.7, 0), align=None)
    revolve(axis=Axis((-20.299251056, -30.9, -8), (0, 0, 1)), revolution_arc=94.313575076, mode=Mode.SUBTRACT)
    with BuildSketch(Plane(origin=(-18.243500534, -28.447676654, 0), x_dir=(0.9607657155546954, -0.2773612082009208, 0), z_dir=(0.2773612082009208, 0.9607657155546954, 0))) as chamfer2_piece_24:
        Polygon((0.5 - CHAMFER2_SIZE, 0), (0.5, CHAMFER2_SIZE), (0.5, 0), align=None)
    revolve(axis=Axis((-18.243500534, -28.447676654, 0), (0, 0, -1)), revolution_arc=113.869886465, mode=Mode.SUBTRACT)
    with BuildSketch(Plane(origin=(-20.299251056, -30.9, 0), x_dir=(0.6424220378622064, 0.7663510457153235, 0), z_dir=(0.7663510457153235, -0.6424220378622064, 0))) as chamfer2_piece_25:
        Polygon((2.7 + CHAMFER2_SIZE, 0), (2.7, -CHAMFER2_SIZE), (2.7, 0), align=None)
    revolve(axis=Axis((-20.299251056, -30.9, 0), (0, 0, 1)), revolution_arc=94.313575076, mode=Mode.SUBTRACT)
    with BuildSketch(Plane(origin=(-22.899251056, -29.034524189, 0), x_dir=(0.812500000000002, -0.5829611908180482, 0), z_dir=(0.5829611908180482, 0.812500000000002, 0))) as chamfer2_piece_26:
        Polygon((0.5 - CHAMFER2_SIZE, 0), (0.5, CHAMFER2_SIZE), (0.5, 0), align=None)
    revolve(axis=Axis((-22.899251056, -29.034524189, 0), (0, 0, -1)), revolution_arc=108.681824608, mode=Mode.SUBTRACT)
    with BuildSketch(Plane(origin=(-25.499251056, -30.9, 0), x_dir=(0.8125000000000023, 0.5829611908180474, 0), z_dir=(0.5829611908180474, -0.8125000000000023, 0))) as chamfer2_piece_27:
        Polygon((2.7 + CHAMFER2_SIZE, 0), (2.7, -CHAMFER2_SIZE), (2.7, 0), align=None)
    revolve(axis=Axis((-25.499251056, -30.9, 0), (0, 0, 1)), revolution_arc=85.453398547, mode=Mode.SUBTRACT)
    with BuildSketch(Plane(origin=(-27.152754798, -28.160305606, 0), x_dir=(0.5167199195075316, -0.8561544981976853, 0), z_dir=(0.8561544981976853, 0.5167199195075316, 0))) as chamfer2_piece_28:
        Polygon((0.5 - CHAMFER2_SIZE, 0), (0.5, CHAMFER2_SIZE), (0.5, 0), align=None)
    revolve(axis=Axis((-27.152754798, -28.160305606, 0), (0, 0, -1)), revolution_arc=121.112486243, mode=Mode.SUBTRACT)
    with BuildSketch(Plane(origin=(26.987245202, -24.11389297, 0), x_dir=(1, 0, 0), z_dir=(0, 1, 0))) as chamfer2_piece_29:
        Polygon((0.5 - CHAMFER2_SIZE, 0), (0.5, CHAMFER2_SIZE), (0.5, 0), align=None)
    revolve(axis=Axis((26.987245202, -24.11389297, 0), (0, 0, -1)), revolution_arc=137.831362799, mode=Mode.SUBTRACT)
    with BuildSketch(Plane(origin=(22.55874146, -28.125, 0), x_dir=(0.7411721744642813, 0.6713149840424306, 0), z_dir=(0.6713149840424306, -0.7411721744642813, 0))) as chamfer2_piece_30:
        Polygon((5.475 + CHAMFER2_SIZE, 0), (5.475, -CHAMFER2_SIZE), (5.475, 0), align=None)
    revolve(axis=Axis((22.55874146, -28.125, 0), (0, 0, 1)), revolution_arc=123.950356593, mode=Mode.SUBTRACT)
    with BuildSketch(Plane(origin=(16.758234972, -26.69156026, 0), x_dir=(0.9707960648529864, -0.23990623265341857, 0), z_dir=(0.23990623265341857, 0.9707960648529864, 0))) as chamfer2_piece_31:
        Polygon((0.5 - CHAMFER2_SIZE, 0), (0.5, CHAMFER2_SIZE), (0.5, 0), align=None)
    revolve(axis=Axis((16.758234972, -26.69156026, 0), (0, 0, -1)), revolution_arc=123.725101084, mode=Mode.SUBTRACT)
    with BuildSketch(Plane(origin=(13.490252059, -29.675, 0), x_dir=(0.7385272118911914, 0.6742236700800583, 0), z_dir=(0.6742236700800583, -0.7385272118911914, 0))) as chamfer2_piece_32:
        Polygon((3.925 + CHAMFER2_SIZE, 0), (3.925, -CHAMFER2_SIZE), (3.925, 0), align=None)
    revolve(axis=Axis((13.490252059, -29.675, 0), (0, 0, 1)), revolution_arc=107.421143416, mode=Mode.SUBTRACT)
    with BuildSketch(Plane(origin=(9.665252059, -27.450140454, 0), x_dir=(0.8644067796610185, -0.5027931177691948, 0), z_dir=(0.5027931177691948, 0.8644067796610185, 0))) as chamfer2_piece_33:
        Polygon((0.5 - CHAMFER2_SIZE, 0), (0.5, CHAMFER2_SIZE), (0.5, 0), align=None)
    revolve(axis=Axis((9.665252059, -27.450140454, 0), (0, 0, -1)), revolution_arc=119.63007225, mode=Mode.SUBTRACT)
    with BuildSketch(Plane(origin=(5.840252059, -29.675, 0), x_dir=(0.864406779661017, 0.5027931177691973, 0), z_dir=(0.5027931177691973, -0.864406779661017, 0))) as chamfer2_piece_34:
        Polygon((3.925 + CHAMFER2_SIZE, 0), (3.925, -CHAMFER2_SIZE), (3.925, 0), align=None)
    revolve(axis=Axis((5.840252059, -29.675, 0), (0, 0, 1)), revolution_arc=136.239259635, mode=Mode.SUBTRACT)
    with BuildSketch(Plane(origin=(1.538885112, -28.636314589, 0), x_dir=(0.9720603270931909, -0.23473116642550618, 0), z_dir=(0.23473116642550618, 0.9720603270931909, 0))) as chamfer2_piece_35:
        Polygon((0.5 - CHAMFER2_SIZE, 0), (0.5, CHAMFER2_SIZE), (0.5, 0), align=None)
    revolve(axis=Axis((1.538885112, -28.636314589, 0), (0, 0, -1)), revolution_arc=112.700145839, mode=Mode.SUBTRACT)
    with BuildSketch(Plane(origin=(-0.250930092, -31.075, 0), x_dir=(0.5916744475658624, 0.8061769955150243, 0), z_dir=(0.8061769955150243, -0.5916744475658624, 0))) as chamfer2_piece_36:
        Polygon((2.525 + CHAMFER2_SIZE, 0), (2.525, -CHAMFER2_SIZE), (2.525, 0), align=None)
    revolve(axis=Axis((-0.250930092, -31.075, 0), (0, 0, 1)), revolution_arc=72.551844659, mode=Mode.SUBTRACT)
    with BuildSketch(Plane(origin=(-2.040745296, -28.636314589, 0), x_dir=(0.5916744475658575, -0.8061769955150281, 0), z_dir=(0.8061769955150281, 0.5916744475658575, 0))) as chamfer2_piece_37:
        Polygon((0.5 - CHAMFER2_SIZE, 0), (0.5, CHAMFER2_SIZE), (0.5, 0), align=None)
    revolve(axis=Axis((-2.040745296, -28.636314589, 0), (0, 0, -1)), revolution_arc=112.700145839, mode=Mode.SUBTRACT)
    with BuildSketch(Plane(origin=(-6.342112243, -29.675, 0), x_dir=(0.9720603270931867, 0.23473116642552358, 0), z_dir=(0.23473116642552358, -0.9720603270931867, 0))) as chamfer2_piece_38:
        Polygon((3.925 + CHAMFER2_SIZE, 0), (3.925, -CHAMFER2_SIZE), (3.925, 0), align=None)
    revolve(axis=Axis((-6.342112243, -29.675, 0), (0, 0, 1)), revolution_arc=136.239259635, mode=Mode.SUBTRACT)
    with BuildSketch(Plane(origin=(-10.167112243, -27.450140454, 0), x_dir=(0.8644067796610155, -0.5027931177692001, 0), z_dir=(0.5027931177692001, 0.8644067796610155, 0))) as chamfer2_piece_39:
        Polygon((0.5 - CHAMFER2_SIZE, 0), (0.5, CHAMFER2_SIZE), (0.5, 0), align=None)
    revolve(axis=Axis((-10.167112243, -27.450140454, 0), (0, 0, -1)), revolution_arc=119.63007225, mode=Mode.SUBTRACT)
    with BuildSketch(Plane(origin=(-13.992112243, -29.675, 0), x_dir=(0.8644067796610168, 0.5027931177691978, 0), z_dir=(0.5027931177691978, -0.8644067796610168, 0))) as chamfer2_piece_40:
        Polygon((3.925 + CHAMFER2_SIZE, 0), (3.925, -CHAMFER2_SIZE), (3.925, 0), align=None)
    revolve(axis=Axis((-13.992112243, -29.675, 0), (0, 0, 1)), revolution_arc=133.712259818, mode=Mode.SUBTRACT)


solid = part.part
